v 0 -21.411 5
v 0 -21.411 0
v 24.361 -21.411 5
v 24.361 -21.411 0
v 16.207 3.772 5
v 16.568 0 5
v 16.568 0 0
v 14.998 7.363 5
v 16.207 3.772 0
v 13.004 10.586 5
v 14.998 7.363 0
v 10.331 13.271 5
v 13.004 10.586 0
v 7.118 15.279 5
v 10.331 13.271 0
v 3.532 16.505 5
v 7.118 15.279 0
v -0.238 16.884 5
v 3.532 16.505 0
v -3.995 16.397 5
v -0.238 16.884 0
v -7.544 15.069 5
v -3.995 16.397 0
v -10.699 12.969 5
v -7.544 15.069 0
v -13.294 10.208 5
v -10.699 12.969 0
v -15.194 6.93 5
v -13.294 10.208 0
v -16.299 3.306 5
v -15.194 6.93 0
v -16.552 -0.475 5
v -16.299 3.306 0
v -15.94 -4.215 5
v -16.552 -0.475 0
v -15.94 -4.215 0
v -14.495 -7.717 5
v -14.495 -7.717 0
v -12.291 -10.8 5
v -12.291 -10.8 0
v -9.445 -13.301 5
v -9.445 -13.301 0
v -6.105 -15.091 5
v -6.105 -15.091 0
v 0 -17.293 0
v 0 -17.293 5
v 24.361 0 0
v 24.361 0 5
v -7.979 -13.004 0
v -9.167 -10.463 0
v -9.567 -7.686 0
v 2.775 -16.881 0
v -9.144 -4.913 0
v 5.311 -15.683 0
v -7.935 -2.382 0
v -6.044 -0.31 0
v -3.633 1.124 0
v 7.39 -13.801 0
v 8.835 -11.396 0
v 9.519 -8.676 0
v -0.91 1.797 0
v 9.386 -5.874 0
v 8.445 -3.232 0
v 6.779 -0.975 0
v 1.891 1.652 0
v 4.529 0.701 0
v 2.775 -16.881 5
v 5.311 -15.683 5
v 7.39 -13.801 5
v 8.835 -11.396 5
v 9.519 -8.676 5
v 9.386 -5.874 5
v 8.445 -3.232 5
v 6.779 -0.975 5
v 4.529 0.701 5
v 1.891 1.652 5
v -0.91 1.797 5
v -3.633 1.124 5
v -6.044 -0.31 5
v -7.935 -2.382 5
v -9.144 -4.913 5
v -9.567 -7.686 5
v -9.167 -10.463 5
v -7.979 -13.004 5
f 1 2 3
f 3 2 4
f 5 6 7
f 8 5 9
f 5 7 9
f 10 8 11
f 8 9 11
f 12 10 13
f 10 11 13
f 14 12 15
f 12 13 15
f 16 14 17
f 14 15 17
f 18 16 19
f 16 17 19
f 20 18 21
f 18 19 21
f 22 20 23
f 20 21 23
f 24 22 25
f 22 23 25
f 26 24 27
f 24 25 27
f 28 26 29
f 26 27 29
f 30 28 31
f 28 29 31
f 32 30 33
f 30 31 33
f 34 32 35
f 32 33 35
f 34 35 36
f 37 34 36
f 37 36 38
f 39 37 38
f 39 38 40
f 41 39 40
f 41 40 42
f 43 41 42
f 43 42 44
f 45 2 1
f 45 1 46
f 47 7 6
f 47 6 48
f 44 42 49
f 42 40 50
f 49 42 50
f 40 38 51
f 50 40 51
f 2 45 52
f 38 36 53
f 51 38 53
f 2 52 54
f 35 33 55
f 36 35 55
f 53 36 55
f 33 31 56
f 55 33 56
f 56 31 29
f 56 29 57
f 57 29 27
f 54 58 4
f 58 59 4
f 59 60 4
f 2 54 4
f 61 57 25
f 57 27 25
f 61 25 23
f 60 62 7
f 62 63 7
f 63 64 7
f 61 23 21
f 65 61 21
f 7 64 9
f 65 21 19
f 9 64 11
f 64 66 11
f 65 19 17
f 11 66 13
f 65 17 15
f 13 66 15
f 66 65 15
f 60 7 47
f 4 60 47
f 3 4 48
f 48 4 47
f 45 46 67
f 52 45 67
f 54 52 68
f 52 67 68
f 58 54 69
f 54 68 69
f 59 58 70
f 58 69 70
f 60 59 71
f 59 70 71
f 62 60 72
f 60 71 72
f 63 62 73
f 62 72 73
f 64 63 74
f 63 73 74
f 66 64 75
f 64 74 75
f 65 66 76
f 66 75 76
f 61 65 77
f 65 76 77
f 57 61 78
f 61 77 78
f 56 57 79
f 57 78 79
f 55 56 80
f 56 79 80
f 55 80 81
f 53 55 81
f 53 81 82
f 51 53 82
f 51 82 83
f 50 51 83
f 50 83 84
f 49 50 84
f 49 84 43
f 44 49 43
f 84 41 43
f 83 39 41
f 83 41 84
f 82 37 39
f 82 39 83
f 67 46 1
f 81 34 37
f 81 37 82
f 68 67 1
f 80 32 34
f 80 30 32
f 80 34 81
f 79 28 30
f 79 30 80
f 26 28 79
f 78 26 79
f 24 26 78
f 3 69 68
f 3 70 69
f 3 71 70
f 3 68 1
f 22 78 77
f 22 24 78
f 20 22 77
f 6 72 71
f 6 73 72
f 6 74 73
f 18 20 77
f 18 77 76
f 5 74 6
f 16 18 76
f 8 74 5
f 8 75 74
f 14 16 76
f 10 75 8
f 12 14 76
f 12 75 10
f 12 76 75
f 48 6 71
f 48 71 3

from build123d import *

# Parameters (mm, degrees)
F0_W     = 24.360565
F0_H     = 21.410812
F1_DEPTH = 5
F2_R     = 16.571277
F3_DEPTH = 5
F4_R     = 9.566685
F5_DEPTH = 6


with BuildPart() as f1:
    # F0 (on Top) → F1 (new body)
    with BuildSketch(Plane.XY):
        with Locations((12.180282, -10.705406)):
            Rectangle(F0_W, F0_H)
    extrude(amount=F1_DEPTH)

    # F2 (on Top) → F3 (join)
    with BuildSketch(Plane.XY):
        with Locations((0, 0.314523)):
            Circle(F2_R)
    extrude(amount=F3_DEPTH)

    # F4 (on face) → F5 (cut)
    with BuildSketch(Plane.XY.offset(5)):
        with Locations((0, -7.725909)):
            Circle(F4_R)
    extrude(amount=-F5_DEPTH, mode=Mode.SUBTRACT)


solid = f1.part
